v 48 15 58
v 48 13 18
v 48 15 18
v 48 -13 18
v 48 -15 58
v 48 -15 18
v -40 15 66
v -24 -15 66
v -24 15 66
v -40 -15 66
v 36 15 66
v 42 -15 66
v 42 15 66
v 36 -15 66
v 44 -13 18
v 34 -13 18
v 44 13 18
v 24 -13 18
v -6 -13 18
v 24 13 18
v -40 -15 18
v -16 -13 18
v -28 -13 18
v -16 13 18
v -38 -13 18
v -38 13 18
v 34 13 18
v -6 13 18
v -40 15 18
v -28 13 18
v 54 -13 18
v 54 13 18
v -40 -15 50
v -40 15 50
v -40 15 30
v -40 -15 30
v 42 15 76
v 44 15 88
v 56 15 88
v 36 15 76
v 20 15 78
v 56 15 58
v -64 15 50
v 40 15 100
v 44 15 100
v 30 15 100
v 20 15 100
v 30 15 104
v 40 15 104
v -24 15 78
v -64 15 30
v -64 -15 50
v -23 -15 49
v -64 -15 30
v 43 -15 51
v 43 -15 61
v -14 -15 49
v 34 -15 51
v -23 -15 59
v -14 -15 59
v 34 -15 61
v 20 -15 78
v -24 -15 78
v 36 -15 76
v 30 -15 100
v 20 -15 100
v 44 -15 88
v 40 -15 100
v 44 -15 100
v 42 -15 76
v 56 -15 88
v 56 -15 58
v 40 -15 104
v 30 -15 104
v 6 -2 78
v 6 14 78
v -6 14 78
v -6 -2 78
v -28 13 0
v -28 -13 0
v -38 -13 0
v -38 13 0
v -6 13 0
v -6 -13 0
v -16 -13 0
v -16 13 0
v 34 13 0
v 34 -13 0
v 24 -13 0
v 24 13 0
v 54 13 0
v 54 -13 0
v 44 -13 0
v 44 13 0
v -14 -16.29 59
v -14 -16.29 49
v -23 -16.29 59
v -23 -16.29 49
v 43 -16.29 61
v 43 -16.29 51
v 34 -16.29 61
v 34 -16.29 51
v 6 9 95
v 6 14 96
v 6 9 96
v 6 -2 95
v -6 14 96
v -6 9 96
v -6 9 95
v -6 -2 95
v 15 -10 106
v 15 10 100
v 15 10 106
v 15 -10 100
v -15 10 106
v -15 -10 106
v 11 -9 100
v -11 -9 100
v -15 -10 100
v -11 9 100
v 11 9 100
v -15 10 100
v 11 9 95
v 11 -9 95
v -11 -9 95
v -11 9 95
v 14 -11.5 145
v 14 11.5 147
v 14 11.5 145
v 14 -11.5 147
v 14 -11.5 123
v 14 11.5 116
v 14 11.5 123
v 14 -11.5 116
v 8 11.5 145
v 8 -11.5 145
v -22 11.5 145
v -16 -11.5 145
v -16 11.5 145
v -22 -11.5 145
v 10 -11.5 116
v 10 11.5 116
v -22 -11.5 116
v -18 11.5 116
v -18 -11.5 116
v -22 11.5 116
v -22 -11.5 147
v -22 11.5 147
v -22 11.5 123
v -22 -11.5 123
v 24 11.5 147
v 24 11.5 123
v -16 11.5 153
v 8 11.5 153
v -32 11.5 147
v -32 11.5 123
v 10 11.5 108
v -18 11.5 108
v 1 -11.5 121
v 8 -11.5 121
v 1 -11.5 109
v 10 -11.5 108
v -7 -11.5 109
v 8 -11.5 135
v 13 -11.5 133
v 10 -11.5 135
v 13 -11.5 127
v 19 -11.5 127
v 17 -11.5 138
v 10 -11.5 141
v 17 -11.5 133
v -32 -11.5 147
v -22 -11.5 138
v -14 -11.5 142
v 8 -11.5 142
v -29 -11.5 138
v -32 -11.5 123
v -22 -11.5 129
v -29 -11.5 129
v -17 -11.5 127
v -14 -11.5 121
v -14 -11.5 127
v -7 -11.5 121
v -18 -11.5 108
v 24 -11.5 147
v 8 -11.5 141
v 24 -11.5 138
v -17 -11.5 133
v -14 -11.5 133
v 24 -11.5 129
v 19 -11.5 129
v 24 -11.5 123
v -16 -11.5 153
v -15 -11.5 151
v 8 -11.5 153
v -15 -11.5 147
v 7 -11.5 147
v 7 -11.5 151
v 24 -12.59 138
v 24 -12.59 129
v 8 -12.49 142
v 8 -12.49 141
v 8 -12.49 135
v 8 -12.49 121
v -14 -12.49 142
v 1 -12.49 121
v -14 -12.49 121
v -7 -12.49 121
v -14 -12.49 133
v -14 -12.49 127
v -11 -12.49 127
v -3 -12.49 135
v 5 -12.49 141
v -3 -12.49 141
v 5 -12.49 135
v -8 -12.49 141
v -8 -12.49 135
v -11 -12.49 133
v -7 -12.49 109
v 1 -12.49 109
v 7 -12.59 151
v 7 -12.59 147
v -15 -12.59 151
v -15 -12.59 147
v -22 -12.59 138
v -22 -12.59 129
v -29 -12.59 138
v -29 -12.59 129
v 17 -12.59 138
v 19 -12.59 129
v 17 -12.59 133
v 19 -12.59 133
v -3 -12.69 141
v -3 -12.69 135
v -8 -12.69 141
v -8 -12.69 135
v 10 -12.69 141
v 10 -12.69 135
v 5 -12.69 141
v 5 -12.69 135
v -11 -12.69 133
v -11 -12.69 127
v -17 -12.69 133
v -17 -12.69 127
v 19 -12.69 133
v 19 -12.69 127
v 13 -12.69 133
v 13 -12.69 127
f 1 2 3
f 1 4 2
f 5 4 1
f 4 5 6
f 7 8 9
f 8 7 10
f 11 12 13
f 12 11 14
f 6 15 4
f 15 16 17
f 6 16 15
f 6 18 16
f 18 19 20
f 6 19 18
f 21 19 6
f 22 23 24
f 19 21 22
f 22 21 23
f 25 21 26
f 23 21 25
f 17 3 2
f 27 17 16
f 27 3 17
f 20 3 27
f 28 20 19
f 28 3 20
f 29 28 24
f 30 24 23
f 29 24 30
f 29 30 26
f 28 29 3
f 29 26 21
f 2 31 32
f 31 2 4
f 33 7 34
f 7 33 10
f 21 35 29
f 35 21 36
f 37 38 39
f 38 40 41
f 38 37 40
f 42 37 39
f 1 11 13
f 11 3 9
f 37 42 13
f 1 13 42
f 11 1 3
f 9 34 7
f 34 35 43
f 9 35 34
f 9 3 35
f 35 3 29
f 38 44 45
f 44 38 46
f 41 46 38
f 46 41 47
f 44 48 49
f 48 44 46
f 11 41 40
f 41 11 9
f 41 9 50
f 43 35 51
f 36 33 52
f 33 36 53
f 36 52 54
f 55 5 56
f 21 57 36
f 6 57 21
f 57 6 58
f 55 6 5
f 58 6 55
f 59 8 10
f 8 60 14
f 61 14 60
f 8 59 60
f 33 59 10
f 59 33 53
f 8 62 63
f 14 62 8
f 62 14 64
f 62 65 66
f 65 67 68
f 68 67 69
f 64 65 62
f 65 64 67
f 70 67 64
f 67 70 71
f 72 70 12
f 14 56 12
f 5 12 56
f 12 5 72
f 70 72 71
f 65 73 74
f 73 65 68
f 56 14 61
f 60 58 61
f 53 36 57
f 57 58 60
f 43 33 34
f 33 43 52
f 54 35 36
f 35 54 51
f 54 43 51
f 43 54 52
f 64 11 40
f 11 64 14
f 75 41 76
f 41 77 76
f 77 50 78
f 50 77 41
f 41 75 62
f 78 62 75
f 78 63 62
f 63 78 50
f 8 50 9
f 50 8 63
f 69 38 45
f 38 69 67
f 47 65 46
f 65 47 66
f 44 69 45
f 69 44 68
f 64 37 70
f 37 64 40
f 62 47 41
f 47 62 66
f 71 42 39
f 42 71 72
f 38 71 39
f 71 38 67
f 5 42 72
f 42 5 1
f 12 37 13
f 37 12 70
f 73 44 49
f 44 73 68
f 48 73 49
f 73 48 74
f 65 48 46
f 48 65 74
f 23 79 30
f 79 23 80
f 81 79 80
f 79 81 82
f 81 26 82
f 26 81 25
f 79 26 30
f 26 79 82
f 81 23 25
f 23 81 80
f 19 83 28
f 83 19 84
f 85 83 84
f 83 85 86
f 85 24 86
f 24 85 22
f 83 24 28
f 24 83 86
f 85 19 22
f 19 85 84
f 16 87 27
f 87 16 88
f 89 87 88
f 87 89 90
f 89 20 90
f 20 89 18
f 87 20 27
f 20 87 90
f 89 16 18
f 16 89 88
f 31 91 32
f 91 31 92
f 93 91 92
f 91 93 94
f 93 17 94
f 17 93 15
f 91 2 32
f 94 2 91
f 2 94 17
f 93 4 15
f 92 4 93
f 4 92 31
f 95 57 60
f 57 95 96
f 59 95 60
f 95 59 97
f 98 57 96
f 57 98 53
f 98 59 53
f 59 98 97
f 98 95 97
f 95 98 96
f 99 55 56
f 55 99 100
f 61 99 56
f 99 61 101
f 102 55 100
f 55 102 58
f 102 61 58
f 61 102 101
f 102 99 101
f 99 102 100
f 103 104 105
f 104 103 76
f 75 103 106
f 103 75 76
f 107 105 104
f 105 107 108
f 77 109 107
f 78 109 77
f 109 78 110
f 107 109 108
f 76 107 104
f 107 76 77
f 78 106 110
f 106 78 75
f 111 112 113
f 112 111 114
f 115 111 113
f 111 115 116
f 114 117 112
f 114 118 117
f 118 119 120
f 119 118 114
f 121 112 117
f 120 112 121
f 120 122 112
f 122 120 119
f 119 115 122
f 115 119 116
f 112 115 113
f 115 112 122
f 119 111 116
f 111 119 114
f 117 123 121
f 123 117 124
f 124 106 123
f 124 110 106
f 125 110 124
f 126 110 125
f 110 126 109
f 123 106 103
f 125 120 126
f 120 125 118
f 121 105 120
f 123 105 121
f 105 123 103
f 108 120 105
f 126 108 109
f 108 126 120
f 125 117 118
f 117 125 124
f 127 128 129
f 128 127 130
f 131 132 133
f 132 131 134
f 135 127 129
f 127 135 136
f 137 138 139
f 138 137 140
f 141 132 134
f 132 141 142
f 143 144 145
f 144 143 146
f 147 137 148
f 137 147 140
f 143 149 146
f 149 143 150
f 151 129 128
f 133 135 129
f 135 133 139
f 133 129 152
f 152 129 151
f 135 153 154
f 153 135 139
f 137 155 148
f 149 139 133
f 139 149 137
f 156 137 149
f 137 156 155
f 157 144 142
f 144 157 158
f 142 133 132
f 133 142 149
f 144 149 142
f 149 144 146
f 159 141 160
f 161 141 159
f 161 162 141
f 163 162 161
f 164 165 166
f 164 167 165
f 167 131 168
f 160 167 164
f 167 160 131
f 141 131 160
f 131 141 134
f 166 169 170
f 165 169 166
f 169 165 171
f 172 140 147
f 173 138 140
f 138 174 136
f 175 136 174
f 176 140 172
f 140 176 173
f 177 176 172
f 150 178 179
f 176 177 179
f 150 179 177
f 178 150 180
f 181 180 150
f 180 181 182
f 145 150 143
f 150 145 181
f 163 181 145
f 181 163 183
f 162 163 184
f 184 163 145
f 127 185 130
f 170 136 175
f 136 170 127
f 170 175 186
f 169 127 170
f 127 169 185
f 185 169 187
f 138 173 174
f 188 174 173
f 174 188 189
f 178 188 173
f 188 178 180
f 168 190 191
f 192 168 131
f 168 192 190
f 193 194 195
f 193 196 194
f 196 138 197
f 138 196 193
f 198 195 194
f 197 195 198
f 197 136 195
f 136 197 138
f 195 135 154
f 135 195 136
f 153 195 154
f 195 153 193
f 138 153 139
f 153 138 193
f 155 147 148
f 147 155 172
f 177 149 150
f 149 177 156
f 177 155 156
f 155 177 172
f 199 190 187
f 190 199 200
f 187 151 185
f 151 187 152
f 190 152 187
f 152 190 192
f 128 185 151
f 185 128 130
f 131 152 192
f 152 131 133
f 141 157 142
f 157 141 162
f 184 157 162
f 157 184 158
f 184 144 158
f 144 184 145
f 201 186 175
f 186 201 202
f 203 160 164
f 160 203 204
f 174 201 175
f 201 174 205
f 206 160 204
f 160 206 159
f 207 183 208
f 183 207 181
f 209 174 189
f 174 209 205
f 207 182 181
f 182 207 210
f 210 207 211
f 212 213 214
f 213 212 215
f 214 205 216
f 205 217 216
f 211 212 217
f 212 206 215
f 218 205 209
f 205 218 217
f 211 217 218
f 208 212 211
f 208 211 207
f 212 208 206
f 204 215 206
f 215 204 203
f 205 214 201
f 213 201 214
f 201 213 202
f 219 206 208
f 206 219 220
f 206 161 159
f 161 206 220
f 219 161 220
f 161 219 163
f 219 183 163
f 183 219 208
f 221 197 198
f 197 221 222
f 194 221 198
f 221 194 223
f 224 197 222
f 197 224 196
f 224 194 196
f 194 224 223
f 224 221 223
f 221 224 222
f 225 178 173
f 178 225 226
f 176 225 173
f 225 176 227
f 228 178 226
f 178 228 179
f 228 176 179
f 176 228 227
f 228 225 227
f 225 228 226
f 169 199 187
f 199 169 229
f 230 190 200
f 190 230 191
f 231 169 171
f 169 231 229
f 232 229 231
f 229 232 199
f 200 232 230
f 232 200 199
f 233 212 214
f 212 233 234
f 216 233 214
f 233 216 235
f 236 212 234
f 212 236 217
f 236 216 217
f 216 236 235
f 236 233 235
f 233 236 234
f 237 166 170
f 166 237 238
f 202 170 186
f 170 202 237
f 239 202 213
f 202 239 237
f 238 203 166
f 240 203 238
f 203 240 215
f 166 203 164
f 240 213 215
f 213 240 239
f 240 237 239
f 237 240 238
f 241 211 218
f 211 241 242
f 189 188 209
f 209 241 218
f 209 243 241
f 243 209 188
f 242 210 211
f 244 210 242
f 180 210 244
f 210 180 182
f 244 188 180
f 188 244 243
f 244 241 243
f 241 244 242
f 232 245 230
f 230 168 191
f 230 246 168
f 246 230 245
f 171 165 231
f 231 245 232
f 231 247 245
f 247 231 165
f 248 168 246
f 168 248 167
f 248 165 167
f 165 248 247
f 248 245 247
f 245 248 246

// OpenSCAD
// Lightbulb Marker - Version 007
// Chunky 3D voxel model; the reference's white sticker outline is not geometry.
// Changes from previous version:
// - Fixed the bulb support gap introduced in v006.
// - Used a narrow gray structural stem so the connector reads as part of the bulb base.
// - Kept the wider/lower 3D body proportions and shallow raised surface details.

eps = 0.01;
$fn = 32;

body_depth = 30;
leg_depth = 26;
bulb_depth = 23;
detail_raise = 1.1;

orange = [0.84, 0.40, 0.26];
black = [0.02, 0.02, 0.02];
bulb_yellow = [1.00, 0.82, 0.38];
bulb_light = [1.00, 0.90, 0.58];
bulb_orange = [0.93, 0.54, 0.20];
bulb_red = [0.70, 0.22, 0.18];
base_gray = [0.60, 0.60, 0.55];
base_dark = [0.38, 0.39, 0.36];

// Rectangles are [x, z, width, height] in the front silhouette.
body_core = [
    [-40, 18, 88, 48],   // broad main body mass
    [-64, 30, 24, 20],   // large left block protrusion
    [-24, 62, 60, 16],   // low stepped upper back
    [20, 76, 24, 24],    // shorter right shoulder
    [42, 58, 14, 30],    // clean right face block
    [30, 96, 10, 8]      // small top step
];

leg_blocks = [
    [-38, 0, 10, 18],
    [-16, 0, 10, 18],
    [24, 0, 10, 18],
    [44, 0, 10, 18]
];

eye_blocks = [
    [-23, 49, 9, 10],
    [34, 51, 9, 10]
];

socket_blocks = [
    [-15, 100, 30, 6],
    [-11, 95, 22, 5],
    [-6, 77, 12, 19]     // narrow structural stem, overlapped into body and socket
];

bulb_blocks = [
    [-22, 116, 36, 29],  // central bulb body
    [-16, 145, 24, 8],   // flatter top cap
    [-32, 123, 10, 24],  // left side lobe
    [14, 123, 10, 24],   // right side lobe
    [-18, 108, 28, 9]    // lower bulb neck
];

bulb_light_blocks = [
    [-14, 121, 22, 21],
    [-7, 109, 8, 12]
];

bulb_orange_blocks = [
    [-15, 147, 22, 4],
    [-29, 129, 7, 9],
    [17, 129, 7, 9]
];

bulb_red_blocks = [
    [-8, 135, 5, 6],
    [5, 135, 5, 6],
    [-17, 127, 6, 6],
    [13, 127, 6, 6]
];

module block3d(x, z, w, d, h, col, y = 0) {
    color(col)
        translate([x, y - d / 2, z])
            cube([w, d, h]);
}

module blocks3d(rects, d, col) {
    union() {
        for (r = rects)
            block3d(r[0], r[1], r[2], d, r[3], col);
    }
}

module front_detail(x, z, w, h, base_depth, col, raise = detail_raise) {
    color(col)
        translate([x, -base_depth / 2 - raise + eps, z])
            cube([w, raise, h]);
}

module front_details(rects, base_depth, col, raise = detail_raise) {
    union() {
        for (r = rects)
            front_detail(r[0], r[1], r[2], r[3], base_depth, col, raise);
    }
}

module orange_body() {
    union() {
        blocks3d(body_core, body_depth, orange);
        blocks3d(leg_blocks, leg_depth, orange);
        front_details(eye_blocks, body_depth, black, 1.3);
    }
}

module socket() {
    union() {
        block3d(socket_blocks[2][0], socket_blocks[2][1], socket_blocks[2][2], 16, socket_blocks[2][3], base_dark, 6);
        block3d(socket_blocks[0][0], socket_blocks[0][1], socket_blocks[0][2], 20, socket_blocks[0][3], base_gray);
        block3d(socket_blocks[1][0], socket_blocks[1][1], socket_blocks[1][2], 18, socket_blocks[1][3], base_dark);
    }
}

module chunky_bulb() {
    union() {
        blocks3d(bulb_blocks, bulb_depth, bulb_yellow);
        front_details(bulb_light_blocks, bulb_depth, bulb_light, 1.0);
        front_details(bulb_orange_blocks, bulb_depth, bulb_orange, 1.1);
        front_details(bulb_red_blocks, bulb_depth, bulb_red, 1.2);
    }
}

module model() {
    union() {
        orange_body();
        socket();
        chunky_bulb();
    }
}

model();
